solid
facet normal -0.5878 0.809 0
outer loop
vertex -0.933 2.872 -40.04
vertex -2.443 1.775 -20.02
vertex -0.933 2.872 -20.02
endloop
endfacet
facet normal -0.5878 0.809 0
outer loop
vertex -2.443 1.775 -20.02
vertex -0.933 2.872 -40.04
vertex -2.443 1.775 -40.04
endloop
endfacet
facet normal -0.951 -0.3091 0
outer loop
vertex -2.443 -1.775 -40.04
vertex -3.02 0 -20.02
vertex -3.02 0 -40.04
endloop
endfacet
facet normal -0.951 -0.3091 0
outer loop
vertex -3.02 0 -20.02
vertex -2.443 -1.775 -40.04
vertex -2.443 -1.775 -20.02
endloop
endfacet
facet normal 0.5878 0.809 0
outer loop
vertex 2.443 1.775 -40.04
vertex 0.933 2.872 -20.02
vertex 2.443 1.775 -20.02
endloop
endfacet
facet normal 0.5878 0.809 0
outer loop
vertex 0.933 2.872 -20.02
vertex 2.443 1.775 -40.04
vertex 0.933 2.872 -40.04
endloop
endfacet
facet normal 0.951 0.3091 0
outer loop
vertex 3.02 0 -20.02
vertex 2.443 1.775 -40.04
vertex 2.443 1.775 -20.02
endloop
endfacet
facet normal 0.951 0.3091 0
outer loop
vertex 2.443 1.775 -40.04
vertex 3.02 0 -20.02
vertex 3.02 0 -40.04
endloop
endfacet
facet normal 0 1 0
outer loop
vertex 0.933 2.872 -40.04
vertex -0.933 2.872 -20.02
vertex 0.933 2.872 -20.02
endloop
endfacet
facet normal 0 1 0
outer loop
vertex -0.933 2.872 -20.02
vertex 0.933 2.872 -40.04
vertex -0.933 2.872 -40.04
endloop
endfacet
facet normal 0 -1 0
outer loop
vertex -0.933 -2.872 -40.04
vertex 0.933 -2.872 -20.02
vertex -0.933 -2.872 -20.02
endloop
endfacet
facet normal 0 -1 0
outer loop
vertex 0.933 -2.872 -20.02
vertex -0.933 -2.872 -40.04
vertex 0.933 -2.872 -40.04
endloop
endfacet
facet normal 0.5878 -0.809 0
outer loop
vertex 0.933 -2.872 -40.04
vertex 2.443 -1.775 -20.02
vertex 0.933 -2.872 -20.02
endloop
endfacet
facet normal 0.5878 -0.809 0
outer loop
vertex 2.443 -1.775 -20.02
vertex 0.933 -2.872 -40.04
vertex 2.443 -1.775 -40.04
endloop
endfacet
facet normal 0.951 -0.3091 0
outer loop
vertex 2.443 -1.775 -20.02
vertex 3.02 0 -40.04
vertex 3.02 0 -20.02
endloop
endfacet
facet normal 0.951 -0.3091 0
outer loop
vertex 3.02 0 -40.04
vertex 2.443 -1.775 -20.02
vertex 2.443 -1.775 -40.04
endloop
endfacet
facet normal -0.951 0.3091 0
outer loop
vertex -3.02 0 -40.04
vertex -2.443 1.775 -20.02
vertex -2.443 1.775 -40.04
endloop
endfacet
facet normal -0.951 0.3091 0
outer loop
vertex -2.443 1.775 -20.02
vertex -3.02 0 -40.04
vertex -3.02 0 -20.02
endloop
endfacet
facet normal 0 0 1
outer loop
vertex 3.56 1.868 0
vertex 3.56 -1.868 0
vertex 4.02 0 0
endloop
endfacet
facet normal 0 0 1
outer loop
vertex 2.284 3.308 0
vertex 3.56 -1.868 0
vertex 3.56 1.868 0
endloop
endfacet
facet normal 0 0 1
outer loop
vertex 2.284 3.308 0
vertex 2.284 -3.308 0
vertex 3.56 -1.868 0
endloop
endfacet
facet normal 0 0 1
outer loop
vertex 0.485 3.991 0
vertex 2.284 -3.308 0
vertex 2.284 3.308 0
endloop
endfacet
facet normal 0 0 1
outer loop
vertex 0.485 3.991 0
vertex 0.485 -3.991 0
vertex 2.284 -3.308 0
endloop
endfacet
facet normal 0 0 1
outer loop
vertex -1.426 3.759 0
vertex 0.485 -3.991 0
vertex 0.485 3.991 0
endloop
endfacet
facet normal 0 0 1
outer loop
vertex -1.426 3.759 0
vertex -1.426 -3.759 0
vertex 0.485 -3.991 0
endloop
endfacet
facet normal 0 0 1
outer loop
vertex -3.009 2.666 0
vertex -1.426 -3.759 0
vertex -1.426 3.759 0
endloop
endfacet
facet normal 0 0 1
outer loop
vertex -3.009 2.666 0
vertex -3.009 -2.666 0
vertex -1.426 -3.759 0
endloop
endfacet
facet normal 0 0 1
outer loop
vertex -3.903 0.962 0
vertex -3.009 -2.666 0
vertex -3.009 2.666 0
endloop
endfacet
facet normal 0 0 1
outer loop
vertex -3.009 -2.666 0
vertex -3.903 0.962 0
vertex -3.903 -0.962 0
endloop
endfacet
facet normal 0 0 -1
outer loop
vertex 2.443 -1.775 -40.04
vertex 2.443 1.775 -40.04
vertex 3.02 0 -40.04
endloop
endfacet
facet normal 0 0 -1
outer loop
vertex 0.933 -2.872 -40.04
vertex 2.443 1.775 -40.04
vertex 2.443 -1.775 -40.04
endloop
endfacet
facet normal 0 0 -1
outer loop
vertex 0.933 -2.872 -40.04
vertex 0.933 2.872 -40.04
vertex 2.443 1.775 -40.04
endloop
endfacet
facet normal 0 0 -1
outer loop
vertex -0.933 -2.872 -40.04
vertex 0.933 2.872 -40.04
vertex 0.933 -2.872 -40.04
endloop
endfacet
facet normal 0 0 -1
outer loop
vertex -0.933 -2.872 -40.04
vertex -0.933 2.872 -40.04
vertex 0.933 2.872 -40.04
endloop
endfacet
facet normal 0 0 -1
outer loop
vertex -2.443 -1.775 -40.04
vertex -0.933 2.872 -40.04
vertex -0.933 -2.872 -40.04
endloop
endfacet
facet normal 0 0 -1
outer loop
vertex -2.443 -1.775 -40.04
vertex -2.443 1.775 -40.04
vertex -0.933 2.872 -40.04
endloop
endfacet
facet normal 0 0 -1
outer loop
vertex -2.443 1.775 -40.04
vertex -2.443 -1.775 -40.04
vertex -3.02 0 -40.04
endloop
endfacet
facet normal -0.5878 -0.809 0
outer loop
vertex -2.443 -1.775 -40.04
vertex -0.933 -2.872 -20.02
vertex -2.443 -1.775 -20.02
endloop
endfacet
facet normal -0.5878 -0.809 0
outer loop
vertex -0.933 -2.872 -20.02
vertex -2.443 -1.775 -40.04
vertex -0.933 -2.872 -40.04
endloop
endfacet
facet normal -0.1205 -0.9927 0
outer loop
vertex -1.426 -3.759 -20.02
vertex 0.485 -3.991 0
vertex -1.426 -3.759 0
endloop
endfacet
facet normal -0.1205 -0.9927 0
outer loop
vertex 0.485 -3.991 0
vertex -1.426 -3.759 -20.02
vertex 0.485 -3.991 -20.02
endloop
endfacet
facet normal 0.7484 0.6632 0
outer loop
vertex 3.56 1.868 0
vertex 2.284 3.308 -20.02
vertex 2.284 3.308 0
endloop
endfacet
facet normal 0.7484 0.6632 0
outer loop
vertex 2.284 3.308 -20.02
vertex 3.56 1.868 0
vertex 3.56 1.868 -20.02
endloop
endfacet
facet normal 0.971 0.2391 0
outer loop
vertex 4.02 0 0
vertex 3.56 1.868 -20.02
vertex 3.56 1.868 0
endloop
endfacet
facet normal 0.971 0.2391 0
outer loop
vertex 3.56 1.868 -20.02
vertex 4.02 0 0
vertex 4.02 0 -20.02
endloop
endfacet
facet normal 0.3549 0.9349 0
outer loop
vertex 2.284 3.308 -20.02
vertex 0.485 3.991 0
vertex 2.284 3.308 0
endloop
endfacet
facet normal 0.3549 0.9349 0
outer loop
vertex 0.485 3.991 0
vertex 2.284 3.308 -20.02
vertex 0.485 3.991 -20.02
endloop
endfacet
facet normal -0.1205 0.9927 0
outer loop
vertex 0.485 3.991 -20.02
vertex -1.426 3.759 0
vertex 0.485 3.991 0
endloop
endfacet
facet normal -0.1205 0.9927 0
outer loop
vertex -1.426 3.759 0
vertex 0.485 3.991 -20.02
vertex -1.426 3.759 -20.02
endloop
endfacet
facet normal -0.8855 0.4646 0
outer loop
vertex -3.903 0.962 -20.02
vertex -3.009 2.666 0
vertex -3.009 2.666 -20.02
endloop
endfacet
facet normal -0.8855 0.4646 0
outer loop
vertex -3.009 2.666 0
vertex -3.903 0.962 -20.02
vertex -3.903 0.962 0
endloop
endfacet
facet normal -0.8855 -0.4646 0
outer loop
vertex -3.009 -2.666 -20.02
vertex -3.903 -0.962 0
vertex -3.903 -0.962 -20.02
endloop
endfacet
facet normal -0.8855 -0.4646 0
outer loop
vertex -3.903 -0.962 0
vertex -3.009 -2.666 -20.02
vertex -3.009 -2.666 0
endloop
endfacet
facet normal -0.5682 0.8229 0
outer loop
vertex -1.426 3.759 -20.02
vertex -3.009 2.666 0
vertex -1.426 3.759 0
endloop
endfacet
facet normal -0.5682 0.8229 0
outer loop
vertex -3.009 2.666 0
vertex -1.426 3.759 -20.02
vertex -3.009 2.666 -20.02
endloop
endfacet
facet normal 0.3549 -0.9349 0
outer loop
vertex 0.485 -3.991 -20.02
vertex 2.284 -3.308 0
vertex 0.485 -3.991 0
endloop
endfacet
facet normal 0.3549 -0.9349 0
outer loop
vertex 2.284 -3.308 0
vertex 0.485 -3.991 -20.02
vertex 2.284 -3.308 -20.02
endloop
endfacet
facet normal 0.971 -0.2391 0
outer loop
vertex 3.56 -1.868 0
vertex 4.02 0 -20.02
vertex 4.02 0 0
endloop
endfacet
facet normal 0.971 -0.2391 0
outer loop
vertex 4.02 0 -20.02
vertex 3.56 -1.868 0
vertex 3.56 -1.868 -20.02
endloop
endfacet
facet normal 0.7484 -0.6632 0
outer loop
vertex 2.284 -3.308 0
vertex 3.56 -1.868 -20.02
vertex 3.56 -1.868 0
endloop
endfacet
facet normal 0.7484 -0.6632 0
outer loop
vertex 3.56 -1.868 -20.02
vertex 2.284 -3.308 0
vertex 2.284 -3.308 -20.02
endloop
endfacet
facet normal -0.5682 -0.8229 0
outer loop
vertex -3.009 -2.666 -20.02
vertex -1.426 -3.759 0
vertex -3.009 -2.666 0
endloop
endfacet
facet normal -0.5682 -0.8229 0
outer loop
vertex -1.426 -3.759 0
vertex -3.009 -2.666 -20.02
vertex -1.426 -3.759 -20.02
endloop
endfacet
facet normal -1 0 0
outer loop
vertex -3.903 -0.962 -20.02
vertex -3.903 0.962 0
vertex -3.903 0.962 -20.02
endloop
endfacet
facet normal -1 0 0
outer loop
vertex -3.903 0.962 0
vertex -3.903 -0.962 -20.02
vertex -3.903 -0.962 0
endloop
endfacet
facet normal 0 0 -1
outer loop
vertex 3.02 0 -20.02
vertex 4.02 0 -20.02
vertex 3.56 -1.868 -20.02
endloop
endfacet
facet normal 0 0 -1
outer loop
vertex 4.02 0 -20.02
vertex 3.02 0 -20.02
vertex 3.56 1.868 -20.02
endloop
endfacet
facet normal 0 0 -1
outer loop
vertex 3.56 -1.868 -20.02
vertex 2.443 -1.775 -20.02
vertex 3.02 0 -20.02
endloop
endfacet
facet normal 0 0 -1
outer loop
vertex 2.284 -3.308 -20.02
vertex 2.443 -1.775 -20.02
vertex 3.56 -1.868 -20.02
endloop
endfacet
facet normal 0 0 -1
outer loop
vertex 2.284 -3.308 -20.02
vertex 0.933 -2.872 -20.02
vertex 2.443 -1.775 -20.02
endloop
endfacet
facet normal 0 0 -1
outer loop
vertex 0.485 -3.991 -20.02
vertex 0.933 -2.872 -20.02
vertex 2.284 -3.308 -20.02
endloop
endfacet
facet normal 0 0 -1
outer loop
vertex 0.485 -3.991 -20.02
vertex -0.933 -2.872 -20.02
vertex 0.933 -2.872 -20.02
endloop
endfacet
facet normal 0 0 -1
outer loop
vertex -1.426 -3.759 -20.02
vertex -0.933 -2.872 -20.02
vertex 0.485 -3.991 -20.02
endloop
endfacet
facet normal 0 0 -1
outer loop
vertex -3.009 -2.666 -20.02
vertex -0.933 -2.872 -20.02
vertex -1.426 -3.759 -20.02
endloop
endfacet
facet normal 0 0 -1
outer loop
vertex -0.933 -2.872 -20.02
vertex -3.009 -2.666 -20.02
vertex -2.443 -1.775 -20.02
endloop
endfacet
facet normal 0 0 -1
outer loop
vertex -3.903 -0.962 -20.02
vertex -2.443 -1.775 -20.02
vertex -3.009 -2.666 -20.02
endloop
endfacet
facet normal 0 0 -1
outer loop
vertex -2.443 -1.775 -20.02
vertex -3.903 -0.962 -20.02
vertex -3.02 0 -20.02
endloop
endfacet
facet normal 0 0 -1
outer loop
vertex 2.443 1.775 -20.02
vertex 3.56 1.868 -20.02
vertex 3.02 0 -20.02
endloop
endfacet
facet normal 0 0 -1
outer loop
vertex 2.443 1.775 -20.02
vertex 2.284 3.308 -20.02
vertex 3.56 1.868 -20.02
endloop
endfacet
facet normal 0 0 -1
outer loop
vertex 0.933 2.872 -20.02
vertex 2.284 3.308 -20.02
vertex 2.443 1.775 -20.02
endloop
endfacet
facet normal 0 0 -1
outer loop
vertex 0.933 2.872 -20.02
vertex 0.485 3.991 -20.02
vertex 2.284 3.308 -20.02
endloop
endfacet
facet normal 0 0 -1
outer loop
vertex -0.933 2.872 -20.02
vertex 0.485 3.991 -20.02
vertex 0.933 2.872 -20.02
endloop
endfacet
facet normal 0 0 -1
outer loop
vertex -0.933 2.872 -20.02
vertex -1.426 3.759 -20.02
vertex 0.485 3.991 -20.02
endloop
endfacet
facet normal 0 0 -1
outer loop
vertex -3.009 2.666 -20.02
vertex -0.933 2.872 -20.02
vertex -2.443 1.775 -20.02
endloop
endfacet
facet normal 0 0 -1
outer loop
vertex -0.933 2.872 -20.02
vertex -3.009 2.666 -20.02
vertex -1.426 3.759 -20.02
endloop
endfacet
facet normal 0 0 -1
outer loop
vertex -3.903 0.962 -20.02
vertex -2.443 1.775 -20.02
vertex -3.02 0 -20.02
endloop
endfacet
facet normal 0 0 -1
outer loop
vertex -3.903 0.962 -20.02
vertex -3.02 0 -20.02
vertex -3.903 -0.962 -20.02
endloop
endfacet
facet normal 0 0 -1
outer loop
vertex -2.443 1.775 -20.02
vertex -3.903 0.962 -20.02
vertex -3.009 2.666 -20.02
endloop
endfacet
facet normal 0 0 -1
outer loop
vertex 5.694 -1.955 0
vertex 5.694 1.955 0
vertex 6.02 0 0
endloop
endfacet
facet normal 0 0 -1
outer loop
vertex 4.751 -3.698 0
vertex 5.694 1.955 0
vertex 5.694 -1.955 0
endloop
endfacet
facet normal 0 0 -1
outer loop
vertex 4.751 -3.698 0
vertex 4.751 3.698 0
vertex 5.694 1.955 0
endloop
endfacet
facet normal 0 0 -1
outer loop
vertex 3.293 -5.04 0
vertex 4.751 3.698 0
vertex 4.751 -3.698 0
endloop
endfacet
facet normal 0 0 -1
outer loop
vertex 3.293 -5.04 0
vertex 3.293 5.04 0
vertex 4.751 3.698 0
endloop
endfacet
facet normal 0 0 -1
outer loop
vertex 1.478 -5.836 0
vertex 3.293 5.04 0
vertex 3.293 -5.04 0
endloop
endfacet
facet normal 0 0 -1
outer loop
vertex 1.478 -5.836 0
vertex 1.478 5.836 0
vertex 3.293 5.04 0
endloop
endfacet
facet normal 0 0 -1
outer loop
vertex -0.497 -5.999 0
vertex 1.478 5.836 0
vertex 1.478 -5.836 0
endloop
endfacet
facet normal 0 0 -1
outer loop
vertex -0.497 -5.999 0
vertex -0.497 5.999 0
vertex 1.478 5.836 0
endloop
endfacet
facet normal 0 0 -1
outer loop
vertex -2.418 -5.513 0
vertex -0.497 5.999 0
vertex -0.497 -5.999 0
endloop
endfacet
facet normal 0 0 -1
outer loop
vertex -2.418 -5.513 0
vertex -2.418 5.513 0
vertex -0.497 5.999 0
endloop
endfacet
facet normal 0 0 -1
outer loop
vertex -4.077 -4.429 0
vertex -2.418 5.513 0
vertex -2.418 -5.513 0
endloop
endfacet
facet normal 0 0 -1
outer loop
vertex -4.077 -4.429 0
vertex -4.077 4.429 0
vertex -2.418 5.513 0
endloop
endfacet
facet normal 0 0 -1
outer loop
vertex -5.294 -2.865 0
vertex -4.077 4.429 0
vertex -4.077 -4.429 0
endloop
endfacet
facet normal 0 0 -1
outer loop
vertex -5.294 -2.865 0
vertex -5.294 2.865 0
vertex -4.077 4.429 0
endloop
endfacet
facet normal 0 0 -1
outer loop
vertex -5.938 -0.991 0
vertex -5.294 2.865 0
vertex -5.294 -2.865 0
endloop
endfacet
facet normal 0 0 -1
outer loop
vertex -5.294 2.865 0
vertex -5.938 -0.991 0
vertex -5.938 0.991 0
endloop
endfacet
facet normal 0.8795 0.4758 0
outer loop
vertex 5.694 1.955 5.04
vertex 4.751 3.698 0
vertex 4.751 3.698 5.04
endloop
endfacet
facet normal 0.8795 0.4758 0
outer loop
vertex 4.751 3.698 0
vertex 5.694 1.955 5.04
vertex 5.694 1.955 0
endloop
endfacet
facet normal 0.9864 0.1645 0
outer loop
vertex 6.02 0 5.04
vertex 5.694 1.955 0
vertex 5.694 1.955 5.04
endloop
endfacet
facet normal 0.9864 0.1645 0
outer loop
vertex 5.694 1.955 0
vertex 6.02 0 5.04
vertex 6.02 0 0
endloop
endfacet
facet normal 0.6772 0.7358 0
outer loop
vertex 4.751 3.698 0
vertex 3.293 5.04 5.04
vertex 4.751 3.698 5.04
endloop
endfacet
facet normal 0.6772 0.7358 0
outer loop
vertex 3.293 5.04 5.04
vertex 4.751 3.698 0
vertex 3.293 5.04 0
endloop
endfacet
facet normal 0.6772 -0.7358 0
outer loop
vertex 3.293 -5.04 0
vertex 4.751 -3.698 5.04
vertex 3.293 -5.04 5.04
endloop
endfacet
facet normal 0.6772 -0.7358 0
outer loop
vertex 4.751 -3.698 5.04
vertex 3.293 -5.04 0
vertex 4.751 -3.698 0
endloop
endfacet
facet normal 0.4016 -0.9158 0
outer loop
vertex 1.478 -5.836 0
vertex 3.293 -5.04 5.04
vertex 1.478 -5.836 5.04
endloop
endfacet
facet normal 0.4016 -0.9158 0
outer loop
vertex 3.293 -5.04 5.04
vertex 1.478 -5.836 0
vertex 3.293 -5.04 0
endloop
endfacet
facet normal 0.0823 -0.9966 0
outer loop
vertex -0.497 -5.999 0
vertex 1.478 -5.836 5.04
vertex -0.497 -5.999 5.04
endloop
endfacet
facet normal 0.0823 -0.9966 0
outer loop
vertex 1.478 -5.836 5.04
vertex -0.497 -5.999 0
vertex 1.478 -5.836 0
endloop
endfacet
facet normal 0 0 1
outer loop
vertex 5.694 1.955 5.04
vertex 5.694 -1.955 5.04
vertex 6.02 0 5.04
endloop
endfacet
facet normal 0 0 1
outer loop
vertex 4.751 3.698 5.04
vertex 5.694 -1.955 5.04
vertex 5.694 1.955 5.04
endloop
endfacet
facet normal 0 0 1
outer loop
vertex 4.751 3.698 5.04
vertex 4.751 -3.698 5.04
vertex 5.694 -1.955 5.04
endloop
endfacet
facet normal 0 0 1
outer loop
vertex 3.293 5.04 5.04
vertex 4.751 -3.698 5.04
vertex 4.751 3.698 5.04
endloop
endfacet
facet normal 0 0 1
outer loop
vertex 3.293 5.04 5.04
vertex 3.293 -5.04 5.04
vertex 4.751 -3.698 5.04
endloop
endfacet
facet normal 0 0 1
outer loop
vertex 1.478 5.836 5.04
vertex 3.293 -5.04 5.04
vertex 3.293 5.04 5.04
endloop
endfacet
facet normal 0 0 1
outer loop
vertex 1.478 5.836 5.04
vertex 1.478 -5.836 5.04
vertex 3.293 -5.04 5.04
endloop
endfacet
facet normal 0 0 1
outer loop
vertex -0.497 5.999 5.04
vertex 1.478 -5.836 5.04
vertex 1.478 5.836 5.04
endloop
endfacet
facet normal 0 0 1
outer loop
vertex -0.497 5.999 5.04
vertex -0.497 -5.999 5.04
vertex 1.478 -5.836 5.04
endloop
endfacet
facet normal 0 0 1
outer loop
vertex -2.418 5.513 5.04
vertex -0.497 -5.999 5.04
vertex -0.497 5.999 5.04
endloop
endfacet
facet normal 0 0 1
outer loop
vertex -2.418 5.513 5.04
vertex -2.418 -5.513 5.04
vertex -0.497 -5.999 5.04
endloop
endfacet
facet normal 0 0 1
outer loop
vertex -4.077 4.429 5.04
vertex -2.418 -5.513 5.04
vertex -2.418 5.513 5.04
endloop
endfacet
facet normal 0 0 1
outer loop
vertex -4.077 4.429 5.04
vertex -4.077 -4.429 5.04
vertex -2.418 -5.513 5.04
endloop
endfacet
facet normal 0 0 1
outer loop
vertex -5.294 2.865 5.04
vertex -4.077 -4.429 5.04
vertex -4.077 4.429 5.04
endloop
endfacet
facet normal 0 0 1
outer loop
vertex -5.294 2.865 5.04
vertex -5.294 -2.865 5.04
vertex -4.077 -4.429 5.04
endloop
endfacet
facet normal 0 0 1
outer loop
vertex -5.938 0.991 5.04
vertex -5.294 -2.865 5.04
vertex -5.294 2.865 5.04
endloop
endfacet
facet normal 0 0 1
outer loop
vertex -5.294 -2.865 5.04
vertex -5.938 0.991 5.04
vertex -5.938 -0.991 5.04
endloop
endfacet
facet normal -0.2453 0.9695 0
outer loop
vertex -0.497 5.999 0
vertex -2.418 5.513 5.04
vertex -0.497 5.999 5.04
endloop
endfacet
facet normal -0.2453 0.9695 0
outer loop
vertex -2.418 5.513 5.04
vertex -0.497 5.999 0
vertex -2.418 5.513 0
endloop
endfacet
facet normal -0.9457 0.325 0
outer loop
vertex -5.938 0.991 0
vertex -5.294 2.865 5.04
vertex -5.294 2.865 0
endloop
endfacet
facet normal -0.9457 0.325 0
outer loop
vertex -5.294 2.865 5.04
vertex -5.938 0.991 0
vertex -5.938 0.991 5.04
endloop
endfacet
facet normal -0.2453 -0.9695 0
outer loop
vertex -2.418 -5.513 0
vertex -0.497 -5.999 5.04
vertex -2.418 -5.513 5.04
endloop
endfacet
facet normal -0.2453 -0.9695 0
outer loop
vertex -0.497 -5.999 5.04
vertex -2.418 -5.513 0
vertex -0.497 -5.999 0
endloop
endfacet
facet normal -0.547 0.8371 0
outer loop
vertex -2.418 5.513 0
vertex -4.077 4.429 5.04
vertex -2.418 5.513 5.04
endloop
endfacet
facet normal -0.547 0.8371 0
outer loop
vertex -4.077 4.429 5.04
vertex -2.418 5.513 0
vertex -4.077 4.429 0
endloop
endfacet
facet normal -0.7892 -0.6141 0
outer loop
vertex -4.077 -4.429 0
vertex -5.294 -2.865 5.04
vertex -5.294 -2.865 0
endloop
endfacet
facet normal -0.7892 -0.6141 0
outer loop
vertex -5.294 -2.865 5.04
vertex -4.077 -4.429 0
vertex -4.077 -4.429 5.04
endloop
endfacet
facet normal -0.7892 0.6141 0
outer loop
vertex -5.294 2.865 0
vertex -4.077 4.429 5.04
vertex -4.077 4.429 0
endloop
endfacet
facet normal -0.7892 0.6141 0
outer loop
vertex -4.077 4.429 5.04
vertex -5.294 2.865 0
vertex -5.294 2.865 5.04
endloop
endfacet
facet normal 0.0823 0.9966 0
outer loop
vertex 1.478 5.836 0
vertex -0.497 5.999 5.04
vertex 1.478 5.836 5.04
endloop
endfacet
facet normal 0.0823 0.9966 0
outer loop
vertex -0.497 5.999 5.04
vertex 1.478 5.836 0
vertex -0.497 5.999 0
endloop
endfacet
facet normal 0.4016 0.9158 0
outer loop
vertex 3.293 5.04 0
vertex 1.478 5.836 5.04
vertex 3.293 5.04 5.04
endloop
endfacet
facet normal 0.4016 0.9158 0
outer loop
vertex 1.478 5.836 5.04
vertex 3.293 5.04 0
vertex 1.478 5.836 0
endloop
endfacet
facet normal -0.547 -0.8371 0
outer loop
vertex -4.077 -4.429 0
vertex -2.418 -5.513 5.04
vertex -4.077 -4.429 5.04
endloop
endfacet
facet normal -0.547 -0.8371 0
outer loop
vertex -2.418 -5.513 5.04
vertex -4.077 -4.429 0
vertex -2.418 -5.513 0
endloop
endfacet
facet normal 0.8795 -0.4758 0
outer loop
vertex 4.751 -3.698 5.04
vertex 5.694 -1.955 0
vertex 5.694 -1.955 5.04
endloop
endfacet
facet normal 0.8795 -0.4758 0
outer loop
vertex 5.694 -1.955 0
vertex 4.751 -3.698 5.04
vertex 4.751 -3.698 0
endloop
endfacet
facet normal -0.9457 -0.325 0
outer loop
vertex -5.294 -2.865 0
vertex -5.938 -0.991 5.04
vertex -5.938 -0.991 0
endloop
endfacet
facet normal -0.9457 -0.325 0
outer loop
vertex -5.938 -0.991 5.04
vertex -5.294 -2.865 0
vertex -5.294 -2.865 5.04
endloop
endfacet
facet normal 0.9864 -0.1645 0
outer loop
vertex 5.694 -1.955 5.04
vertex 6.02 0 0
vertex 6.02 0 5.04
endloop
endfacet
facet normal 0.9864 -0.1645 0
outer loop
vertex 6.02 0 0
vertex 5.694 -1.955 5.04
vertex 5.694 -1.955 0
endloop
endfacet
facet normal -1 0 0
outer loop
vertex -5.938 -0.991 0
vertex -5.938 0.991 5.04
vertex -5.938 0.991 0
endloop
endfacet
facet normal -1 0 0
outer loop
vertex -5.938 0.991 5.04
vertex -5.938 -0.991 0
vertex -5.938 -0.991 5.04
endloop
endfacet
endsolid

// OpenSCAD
// file: ../Parameters.scad
function mm(i) = i*25.4; 

//Build dimensions (x,y,z)-- x, y and z of printable area, NOT of overall device

//z-rod length, diameter-- dependent on which rods you buy
//(bearing diameter is dependent on rod diameter)

function ZrodLength()=1000;
function ZrodDiameter()=20;
function ZrodRadius()=ZrodDiameter()/2;

function ZrodSpacing()=130;


//parametric of which hotend is being used (printerbot or bucha nozzle)

//stepper vs servo

//3 parameters (1 for each link) horizontal vs vertical

//paper is a parametric vitamin

//distance between link arms will be calculable based on radius of toolplate





//tolerances
function LaserCutTolerance() = .02;
function 3dPrinterTolerance() = .04;




//the equation used for plastic width, it can of course be changed
function PlasticWidth()= (ZrodDiameter()/2);
function SideWidth() = (ZrodDiameter()+PlasticWidth());
// main file
use<../Parameters.scad>

//right now this is a little kludged because it's modeling a plastic screw being used as a bolt, so that it slides through one side of the grip and then grabs onto the other

function OuterDiameter() = 8 + 3dPrinterTolerance();
function BoltDiameter()= 6 + 3dPrinterTolerance();
function BoltLength()= 40 + 3dPrinterTolerance();
function BoltHeadDiameter()= 12 + 3dPrinterTolerance();
function BoltHeadHeight()= 5 + 3dPrinterTolerance();

//err on the side of larger tolerances for bolts

module SmallBolt()
{
	union()
	{
		translate([0,0,-BoltLength()])
		{
			union()
			{
				cylinder(BoltLength(), BoltDiameter()/2, BoltDiameter()/2);
				translate([0,0,BoltLength()/2])
				{
					cylinder(BoltLength()/2, OuterDiameter()/2, OuterDiameter()/2);
				}
			}
		}
		cylinder(BoltHeadHeight(), BoltHeadDiameter()/2,BoltHeadDiameter()/2);
	}
}



SmallBolt();
